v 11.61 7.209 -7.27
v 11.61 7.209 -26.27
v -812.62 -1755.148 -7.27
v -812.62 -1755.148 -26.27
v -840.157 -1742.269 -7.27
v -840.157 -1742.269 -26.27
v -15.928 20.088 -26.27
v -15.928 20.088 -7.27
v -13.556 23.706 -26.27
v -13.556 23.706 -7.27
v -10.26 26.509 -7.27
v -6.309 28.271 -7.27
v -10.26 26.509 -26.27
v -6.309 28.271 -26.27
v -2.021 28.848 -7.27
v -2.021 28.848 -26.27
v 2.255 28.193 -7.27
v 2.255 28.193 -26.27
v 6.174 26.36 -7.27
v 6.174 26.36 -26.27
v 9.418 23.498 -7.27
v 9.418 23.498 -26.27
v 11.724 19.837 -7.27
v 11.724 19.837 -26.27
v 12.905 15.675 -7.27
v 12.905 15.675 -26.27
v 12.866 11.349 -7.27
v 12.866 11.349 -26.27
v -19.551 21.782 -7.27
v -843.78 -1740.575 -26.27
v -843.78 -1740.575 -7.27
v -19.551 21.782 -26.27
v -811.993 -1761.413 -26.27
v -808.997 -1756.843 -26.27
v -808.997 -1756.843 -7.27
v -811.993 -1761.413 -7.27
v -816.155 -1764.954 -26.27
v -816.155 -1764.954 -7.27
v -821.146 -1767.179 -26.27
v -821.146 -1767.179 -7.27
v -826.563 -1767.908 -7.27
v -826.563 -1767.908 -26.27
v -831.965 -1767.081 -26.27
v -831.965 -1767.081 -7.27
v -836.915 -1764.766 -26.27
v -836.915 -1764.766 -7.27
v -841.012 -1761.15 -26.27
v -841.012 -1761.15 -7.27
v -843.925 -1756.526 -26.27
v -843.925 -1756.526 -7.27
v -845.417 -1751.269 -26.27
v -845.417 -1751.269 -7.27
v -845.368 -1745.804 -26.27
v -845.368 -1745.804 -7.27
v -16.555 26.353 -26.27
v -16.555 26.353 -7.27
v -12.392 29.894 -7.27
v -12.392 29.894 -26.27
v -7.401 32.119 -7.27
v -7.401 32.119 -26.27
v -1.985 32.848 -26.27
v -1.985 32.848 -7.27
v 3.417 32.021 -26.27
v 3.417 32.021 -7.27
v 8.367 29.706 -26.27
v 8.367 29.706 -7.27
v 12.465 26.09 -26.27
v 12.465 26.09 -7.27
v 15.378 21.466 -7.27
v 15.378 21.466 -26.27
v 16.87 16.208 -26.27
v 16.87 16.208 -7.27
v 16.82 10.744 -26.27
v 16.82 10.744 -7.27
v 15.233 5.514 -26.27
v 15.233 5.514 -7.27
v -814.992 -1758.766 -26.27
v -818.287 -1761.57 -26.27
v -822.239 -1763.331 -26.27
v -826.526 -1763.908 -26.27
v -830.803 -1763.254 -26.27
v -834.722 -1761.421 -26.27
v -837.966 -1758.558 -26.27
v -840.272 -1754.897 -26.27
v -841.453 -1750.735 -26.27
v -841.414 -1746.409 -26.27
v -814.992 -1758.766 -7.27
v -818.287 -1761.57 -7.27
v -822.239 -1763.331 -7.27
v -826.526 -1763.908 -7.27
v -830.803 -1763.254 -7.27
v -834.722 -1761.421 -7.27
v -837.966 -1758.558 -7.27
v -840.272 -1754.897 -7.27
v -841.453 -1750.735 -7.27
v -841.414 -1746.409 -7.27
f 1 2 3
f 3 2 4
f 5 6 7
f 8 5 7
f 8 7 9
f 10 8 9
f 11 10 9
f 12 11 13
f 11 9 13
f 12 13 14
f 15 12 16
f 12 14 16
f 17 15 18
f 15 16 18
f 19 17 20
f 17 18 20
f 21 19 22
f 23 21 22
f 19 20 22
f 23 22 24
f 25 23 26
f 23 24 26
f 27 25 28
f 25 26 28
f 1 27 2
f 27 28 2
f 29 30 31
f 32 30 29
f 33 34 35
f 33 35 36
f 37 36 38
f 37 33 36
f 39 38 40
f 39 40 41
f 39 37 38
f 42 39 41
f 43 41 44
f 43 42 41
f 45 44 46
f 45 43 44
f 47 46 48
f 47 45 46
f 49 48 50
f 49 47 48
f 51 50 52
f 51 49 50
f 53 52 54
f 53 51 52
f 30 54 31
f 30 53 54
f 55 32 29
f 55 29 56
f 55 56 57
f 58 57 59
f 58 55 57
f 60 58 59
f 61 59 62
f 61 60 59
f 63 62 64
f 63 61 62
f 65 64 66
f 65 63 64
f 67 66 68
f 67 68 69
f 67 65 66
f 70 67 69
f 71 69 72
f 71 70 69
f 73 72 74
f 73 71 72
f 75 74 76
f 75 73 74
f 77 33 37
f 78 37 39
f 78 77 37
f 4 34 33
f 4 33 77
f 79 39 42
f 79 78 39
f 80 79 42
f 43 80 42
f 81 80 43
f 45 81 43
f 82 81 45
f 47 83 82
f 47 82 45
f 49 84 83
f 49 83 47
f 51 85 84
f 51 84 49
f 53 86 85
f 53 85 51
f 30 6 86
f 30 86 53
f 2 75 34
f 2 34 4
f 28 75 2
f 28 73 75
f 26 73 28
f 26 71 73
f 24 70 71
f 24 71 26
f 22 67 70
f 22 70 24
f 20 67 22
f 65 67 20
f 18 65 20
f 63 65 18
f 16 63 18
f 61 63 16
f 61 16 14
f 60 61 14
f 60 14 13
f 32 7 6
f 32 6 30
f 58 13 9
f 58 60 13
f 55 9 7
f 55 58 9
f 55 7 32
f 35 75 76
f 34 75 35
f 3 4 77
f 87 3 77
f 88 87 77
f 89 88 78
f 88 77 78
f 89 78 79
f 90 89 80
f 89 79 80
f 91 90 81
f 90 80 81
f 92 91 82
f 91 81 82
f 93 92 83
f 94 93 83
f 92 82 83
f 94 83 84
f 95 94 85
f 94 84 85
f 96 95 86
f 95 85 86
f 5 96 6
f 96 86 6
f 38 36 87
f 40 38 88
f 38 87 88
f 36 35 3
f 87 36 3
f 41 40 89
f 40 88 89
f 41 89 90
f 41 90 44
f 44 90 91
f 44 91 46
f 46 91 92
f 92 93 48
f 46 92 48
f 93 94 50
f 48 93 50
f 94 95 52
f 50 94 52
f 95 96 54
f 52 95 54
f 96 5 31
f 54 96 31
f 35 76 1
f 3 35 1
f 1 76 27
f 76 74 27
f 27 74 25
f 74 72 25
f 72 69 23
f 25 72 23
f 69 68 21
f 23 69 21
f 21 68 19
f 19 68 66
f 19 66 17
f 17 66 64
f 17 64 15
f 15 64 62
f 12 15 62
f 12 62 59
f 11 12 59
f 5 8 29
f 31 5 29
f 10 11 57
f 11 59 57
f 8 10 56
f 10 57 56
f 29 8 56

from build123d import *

# Parameters (mm, degrees)
EXTRUDE_THIN1_START = -26.269809
EXTRUDE_THIN1_DEPTH = 19


with BuildPart() as part:
    # Sketch2 → Extrude-Thin1 (new body)
    with BuildSketch(Plane(origin=(-2.158928767, 13.648417367, 0), x_dir=(1, 0, 0), z_dir=(0, 0, 1)).offset(EXTRUDE_THIN1_START)):
        with BuildLine():
            Line((-841.621500671, -1754.223207182), (-17.391917272, 8.133954365))
            ThreePointArc((-17.391917272, 8.133954365), (8.133954365, 17.391917272), (17.391917272, -8.133954365))
            Line((17.391917272, -8.133954365), (-806.837666127, -1770.491115912))
            ThreePointArc((-806.837666127, -1770.491115912), (-832.363537764, -1779.749078819), (-841.621500671, -1754.223207182))
        make_face()
        with BuildLine():
            Line((-837.998184572, -1755.917781008), (-13.768601173, 6.439380539))
            ThreePointArc((-13.768601173, 6.439380539), (6.439380539, 13.768601173), (13.768601173, -6.439380539))
            Line((13.768601173, -6.439380539), (-810.460982226, -1768.796542086))
            ThreePointArc((-810.460982226, -1768.796542086), (-830.668963938, -1776.12576272), (-837.998184572, -1755.917781008))
        make_face(mode=Mode.SUBTRACT)
    extrude(amount=EXTRUDE_THIN1_DEPTH)


solid = part.part
